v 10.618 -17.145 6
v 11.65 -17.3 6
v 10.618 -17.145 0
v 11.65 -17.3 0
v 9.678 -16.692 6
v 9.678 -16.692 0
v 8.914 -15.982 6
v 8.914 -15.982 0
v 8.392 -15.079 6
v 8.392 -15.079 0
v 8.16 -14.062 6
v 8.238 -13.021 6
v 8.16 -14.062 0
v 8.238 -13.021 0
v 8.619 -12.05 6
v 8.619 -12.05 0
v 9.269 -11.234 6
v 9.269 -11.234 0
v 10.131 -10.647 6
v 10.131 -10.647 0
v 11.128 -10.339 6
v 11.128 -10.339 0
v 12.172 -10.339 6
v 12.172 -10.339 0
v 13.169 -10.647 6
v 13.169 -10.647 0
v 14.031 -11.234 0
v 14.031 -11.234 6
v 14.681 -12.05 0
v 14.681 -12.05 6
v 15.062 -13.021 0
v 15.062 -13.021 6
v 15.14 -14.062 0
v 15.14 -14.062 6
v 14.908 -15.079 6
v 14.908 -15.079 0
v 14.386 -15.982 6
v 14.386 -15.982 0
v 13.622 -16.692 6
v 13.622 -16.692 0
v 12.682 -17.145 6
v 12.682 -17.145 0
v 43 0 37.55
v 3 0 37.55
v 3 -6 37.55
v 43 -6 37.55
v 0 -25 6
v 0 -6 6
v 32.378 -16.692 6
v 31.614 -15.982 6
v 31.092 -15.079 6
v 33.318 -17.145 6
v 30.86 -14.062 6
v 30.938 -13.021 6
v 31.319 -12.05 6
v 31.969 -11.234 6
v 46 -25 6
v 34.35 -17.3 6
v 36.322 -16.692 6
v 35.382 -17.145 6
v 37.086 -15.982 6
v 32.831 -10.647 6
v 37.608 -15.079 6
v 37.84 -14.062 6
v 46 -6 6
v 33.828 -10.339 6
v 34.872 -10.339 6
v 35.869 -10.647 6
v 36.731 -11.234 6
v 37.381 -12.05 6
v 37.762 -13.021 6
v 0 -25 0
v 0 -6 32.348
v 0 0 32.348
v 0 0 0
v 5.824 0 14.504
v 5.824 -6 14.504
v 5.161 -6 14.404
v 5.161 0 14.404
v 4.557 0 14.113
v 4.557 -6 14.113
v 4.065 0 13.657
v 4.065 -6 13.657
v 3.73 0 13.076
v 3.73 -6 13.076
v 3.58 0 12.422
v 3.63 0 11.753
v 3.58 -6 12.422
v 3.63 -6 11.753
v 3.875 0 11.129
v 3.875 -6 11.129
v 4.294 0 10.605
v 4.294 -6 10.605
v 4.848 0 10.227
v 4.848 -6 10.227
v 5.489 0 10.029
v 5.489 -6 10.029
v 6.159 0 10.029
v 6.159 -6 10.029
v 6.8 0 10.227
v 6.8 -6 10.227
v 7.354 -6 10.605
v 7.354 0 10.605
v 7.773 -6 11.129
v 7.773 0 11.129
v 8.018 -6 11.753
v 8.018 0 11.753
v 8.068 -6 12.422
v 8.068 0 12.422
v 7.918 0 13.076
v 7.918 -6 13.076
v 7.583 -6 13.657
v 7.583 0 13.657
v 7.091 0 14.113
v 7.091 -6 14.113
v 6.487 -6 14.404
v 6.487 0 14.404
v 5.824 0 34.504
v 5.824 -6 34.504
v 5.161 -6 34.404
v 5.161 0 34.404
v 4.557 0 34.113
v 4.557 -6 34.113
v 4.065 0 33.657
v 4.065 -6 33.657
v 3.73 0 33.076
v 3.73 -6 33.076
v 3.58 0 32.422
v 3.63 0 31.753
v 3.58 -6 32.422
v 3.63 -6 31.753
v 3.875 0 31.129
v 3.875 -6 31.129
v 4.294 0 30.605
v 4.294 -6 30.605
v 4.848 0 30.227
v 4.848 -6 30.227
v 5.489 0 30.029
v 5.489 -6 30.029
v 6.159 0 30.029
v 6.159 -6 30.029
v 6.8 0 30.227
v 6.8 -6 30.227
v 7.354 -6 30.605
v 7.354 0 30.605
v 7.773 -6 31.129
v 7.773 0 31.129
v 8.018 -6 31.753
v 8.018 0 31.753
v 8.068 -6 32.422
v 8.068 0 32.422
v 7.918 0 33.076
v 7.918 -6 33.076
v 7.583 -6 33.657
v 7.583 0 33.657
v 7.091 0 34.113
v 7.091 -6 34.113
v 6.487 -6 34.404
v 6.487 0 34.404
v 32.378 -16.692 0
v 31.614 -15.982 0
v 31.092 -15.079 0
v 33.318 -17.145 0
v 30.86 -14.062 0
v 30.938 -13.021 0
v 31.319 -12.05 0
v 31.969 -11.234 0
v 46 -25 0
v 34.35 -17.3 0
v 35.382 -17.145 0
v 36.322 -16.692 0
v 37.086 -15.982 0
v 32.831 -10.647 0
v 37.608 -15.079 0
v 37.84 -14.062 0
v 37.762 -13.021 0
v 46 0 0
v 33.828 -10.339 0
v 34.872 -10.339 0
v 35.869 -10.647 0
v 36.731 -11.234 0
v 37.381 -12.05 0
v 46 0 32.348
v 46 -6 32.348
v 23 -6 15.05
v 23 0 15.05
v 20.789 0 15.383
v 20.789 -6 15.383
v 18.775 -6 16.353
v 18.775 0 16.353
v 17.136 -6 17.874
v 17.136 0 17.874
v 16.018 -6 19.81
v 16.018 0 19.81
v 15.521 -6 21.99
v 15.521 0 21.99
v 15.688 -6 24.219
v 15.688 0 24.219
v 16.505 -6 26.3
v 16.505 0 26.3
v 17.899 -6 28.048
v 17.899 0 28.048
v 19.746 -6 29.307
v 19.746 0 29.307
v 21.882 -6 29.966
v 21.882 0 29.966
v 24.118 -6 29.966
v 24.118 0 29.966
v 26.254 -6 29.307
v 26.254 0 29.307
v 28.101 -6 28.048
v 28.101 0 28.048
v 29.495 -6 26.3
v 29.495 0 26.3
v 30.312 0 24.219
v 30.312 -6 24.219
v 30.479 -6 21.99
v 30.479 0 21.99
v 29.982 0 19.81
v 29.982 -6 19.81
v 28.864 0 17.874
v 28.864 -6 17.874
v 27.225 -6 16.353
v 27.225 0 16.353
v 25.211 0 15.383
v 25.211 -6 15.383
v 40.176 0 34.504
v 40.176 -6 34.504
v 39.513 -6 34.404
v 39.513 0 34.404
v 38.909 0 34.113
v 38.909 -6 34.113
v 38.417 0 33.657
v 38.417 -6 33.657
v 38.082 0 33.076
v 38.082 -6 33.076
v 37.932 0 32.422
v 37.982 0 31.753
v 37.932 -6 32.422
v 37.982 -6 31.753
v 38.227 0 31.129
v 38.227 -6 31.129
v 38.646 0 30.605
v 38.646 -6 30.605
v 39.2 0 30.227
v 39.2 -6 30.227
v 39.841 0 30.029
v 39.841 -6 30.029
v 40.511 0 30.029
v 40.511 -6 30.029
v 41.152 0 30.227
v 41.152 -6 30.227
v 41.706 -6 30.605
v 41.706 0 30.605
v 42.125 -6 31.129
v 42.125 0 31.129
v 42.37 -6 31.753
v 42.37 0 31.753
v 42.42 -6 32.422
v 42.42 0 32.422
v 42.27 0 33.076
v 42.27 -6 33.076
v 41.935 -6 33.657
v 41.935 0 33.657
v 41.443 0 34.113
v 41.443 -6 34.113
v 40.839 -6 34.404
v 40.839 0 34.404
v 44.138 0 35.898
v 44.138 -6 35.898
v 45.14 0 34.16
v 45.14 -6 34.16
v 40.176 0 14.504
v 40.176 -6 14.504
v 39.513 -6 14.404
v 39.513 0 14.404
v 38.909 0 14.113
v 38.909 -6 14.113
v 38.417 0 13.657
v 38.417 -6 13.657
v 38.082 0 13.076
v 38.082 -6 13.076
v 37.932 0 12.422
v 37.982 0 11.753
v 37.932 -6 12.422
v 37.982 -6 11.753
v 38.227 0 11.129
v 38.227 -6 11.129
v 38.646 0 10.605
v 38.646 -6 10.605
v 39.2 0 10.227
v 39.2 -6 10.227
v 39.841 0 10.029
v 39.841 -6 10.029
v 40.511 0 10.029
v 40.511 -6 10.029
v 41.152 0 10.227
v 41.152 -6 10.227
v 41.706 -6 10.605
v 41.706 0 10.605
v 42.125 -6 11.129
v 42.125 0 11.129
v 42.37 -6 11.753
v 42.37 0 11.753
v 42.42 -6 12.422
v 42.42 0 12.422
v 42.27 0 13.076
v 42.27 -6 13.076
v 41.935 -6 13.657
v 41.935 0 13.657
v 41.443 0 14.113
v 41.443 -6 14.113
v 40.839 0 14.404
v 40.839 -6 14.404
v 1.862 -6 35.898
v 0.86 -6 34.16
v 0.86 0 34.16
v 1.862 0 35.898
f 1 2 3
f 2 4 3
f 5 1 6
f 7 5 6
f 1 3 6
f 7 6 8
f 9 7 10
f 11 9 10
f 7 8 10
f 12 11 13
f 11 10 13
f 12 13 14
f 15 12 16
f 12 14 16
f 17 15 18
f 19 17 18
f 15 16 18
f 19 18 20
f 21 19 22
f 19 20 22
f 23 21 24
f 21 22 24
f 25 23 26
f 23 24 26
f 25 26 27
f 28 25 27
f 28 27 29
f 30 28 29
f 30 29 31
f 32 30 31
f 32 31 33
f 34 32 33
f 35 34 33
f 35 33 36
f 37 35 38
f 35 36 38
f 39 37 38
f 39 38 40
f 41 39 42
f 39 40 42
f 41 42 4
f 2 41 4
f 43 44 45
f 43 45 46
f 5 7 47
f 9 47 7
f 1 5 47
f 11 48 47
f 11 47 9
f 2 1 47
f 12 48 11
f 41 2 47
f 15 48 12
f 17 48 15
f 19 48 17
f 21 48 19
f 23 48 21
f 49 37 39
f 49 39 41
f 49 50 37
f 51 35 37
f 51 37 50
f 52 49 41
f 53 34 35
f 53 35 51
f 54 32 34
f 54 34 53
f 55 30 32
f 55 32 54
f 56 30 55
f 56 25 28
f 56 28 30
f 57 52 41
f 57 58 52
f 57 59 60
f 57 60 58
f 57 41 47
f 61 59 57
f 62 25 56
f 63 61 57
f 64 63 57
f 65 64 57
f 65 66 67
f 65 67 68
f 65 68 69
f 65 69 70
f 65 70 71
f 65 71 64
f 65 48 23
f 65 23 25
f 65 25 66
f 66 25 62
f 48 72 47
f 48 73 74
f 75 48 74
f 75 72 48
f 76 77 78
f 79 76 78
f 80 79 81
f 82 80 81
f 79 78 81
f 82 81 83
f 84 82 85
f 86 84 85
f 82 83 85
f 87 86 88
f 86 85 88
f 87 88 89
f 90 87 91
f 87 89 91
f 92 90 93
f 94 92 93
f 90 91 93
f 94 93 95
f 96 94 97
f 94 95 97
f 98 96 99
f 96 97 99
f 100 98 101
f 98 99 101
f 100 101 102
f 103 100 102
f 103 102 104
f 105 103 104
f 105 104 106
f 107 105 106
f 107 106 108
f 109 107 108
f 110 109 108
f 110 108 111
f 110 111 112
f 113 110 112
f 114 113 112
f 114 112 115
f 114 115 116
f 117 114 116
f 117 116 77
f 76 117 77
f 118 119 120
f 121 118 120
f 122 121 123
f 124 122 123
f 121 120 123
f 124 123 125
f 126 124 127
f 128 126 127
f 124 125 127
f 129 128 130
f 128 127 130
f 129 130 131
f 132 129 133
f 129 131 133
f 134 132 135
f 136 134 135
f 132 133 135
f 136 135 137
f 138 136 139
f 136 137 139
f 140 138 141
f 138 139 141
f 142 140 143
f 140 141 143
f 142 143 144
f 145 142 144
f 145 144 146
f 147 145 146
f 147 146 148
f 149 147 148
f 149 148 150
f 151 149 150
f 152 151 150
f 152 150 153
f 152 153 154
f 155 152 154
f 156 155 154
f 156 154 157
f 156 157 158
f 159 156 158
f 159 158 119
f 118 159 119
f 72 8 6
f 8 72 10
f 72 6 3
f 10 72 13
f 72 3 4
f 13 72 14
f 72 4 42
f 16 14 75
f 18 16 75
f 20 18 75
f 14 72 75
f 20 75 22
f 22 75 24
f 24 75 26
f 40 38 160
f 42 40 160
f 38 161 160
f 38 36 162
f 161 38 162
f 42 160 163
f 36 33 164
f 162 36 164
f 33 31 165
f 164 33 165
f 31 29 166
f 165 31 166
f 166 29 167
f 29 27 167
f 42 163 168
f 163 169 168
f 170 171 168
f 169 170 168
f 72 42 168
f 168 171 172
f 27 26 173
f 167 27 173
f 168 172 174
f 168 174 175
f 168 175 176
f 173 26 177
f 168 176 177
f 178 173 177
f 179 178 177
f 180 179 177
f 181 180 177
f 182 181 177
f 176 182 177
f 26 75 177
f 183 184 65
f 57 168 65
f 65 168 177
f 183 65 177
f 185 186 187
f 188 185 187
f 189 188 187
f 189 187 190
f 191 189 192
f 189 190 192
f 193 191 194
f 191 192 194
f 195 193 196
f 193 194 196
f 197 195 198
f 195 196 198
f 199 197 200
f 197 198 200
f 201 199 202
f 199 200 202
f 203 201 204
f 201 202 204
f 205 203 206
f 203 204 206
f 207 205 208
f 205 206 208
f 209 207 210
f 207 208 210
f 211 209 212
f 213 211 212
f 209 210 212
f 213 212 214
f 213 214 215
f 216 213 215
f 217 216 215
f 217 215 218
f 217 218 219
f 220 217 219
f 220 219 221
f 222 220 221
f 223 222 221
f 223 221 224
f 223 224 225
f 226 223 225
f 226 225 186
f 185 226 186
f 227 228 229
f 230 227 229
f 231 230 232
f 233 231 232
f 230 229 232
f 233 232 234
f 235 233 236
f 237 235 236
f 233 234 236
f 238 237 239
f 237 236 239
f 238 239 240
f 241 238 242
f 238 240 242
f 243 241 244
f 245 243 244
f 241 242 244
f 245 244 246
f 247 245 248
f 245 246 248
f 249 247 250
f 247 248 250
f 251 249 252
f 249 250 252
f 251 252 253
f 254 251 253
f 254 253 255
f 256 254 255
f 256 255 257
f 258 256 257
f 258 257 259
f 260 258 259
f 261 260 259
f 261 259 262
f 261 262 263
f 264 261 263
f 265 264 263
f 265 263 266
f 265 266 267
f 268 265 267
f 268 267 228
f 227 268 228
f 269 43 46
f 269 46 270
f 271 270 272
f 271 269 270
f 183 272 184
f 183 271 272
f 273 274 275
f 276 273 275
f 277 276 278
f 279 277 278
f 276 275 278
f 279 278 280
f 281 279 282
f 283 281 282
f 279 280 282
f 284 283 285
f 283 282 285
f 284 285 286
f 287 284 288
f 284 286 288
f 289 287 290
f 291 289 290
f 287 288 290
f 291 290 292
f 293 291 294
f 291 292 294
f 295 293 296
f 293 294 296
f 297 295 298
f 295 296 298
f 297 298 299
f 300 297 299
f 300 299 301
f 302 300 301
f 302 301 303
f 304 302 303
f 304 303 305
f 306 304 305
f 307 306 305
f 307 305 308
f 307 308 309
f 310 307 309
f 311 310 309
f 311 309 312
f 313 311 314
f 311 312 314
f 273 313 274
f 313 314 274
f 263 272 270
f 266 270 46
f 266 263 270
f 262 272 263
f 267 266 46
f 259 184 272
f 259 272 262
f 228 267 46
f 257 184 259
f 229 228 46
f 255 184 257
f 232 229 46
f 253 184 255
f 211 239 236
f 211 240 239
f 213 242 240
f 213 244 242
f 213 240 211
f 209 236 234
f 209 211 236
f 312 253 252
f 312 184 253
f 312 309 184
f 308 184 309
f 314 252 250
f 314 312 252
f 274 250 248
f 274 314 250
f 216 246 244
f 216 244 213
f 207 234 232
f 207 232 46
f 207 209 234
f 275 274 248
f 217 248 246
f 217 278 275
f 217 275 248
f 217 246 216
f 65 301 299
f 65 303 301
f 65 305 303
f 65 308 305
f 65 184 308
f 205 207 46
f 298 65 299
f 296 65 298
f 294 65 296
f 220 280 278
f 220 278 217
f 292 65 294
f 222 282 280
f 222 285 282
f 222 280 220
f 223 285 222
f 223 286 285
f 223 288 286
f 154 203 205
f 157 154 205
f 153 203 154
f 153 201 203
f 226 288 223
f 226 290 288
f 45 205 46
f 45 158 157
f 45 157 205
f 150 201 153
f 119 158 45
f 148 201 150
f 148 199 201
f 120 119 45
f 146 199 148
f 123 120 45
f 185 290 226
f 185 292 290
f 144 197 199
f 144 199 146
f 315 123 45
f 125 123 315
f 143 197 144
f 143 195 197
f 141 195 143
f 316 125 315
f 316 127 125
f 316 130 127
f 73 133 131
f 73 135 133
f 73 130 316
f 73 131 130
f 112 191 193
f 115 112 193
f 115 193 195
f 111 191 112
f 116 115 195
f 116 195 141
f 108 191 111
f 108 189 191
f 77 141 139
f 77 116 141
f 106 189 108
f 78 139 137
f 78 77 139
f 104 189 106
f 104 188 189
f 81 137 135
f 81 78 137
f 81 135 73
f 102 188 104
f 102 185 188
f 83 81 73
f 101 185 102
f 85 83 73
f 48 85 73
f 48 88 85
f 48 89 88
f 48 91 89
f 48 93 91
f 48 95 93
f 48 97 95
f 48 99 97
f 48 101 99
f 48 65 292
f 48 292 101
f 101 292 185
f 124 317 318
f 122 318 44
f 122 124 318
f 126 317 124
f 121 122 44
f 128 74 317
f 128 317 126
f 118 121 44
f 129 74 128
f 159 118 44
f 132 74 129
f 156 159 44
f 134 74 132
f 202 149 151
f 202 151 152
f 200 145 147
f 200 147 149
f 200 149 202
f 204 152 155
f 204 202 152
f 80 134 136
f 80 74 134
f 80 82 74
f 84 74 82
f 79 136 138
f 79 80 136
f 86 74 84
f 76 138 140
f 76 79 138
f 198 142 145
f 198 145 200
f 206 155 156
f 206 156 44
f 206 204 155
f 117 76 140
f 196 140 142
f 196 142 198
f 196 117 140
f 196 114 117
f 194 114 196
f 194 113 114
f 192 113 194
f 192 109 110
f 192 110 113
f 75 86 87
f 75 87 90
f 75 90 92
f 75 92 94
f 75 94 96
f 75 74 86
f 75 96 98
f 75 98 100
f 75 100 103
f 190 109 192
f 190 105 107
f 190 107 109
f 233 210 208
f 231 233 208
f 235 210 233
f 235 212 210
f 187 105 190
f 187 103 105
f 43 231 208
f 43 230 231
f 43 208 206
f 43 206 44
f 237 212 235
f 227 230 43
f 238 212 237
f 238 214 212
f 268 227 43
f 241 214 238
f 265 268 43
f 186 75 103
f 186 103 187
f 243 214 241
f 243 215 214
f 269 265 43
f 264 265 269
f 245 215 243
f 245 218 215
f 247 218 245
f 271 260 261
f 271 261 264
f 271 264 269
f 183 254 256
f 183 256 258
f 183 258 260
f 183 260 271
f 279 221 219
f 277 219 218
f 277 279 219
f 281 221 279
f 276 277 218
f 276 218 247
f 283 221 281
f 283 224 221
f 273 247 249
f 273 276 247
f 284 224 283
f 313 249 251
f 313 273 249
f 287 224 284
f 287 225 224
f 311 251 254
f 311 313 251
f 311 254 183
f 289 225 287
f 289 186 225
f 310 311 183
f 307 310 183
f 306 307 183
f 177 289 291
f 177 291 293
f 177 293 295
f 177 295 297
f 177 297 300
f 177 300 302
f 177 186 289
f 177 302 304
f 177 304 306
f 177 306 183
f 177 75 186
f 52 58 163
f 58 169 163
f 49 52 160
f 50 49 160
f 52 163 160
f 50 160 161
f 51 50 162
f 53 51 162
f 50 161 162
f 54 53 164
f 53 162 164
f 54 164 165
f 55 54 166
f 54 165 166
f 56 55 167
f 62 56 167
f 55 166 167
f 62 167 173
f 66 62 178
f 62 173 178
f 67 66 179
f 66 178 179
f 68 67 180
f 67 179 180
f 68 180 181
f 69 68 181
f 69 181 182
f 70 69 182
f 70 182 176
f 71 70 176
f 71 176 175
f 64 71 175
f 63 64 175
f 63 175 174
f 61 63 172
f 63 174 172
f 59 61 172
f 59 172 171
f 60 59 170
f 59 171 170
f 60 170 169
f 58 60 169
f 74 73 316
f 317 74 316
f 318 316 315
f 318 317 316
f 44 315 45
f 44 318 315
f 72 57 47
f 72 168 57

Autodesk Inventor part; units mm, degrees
ref_plane "YZ Plane" through (0, 0, 0) normal (1, 0, 0) x (0, 1, 0)
ref_plane "XZ Plane" through (0, 0, 0) normal (0, 1, 0) x (-1, 0, 0)
ref_plane "XY Plane" through (0, 0, 0) normal (0, 0, 1) x (1, 0, 0)
sketch "Sketch1" plane through (0, 0, 0) normal (0, 0, 1) x (1, 0, 0)
  line L0 (0, 0) -> (46, 0)
  line L1 (46, 0) -> (46, -25)
  line L2 (46, -25) -> (0, -25)
  line L3 (0, -25) -> (0, 0)
  dimension "d0" = 46
  dimension "d1" = 25
extrude "Extrusion1" add sketch "Sketch1" along normal blind 6
sketch "Sketch2" plane through (0, 0, 6) normal (0, 0, 1) x (1, 0, 0)
  line L0 (46, 0) -> (0, 0) construction
  line L1 (23, 0) -> (23, -25) construction
  line L2 (0, -25) -> (46, -25) construction
  line L3 (0, 0) -> (0, -25) construction
  line L4 (0, -13.8) -> (11.65, -13.8) construction
  point P0 (34.35, -13.8)
  dimension "d5" = 13.8
  dimension "d34" = 11.65
hole "Hole1" at (11.65, -13.8, 6) at (34.35, -13.8, 6) direction (0, 0, -1) diameter 7 end through all
sketch "Sketch3" plane through (0, 0, 6) normal (0, 0, 1) x (1, 0, 0)
  line L0 (46, -25) -> (46, 0) projected
  line L1 (0, 0) -> (46, 0)
  line L2 (46, 0) -> (46, -6)
  line L3 (46, -6) -> (0, -6)
  line L4 (0, -6) -> (0, 0)
  dimension "d13" = 6
extrude "Extrusion2" add sketch "Sketch3" along normal blind 31.55
sketch "Sketch4" plane through (0, 0, 0) normal (0, 1, 0) x (1, 0, 0)
  line L0 (0, 0) -> (0, -37.55) construction
  line L1 (0, -12.254) -> (5.824, -12.254) construction
  line L2 (0, -6) -> (46, -6) construction
  line L3 (0, 0) -> (46, 0) construction
  line L4 (23, 0) -> (23, -37.55) construction
  line L5 (46, -37.55) -> (0, -37.55) construction
  line L6 (0, -32.254) -> (5.824, -32.254) construction
  point P0 (40.176, -32.254)
  point P1 (40.176, -12.254)
  dimension "d16" = 12.254
  dimension "d17" = 5.824
  dimension "d18" = 20
hole "Hole2" at (5.824, 0, 32.254) at (5.824, 0, 12.254) at (40.176, 0, 32.254) at (40.176, 0, 12.254) direction (0, -1, 0) diameter 4.5 end through all
sketch "Sketch5" plane through (0, -6, 6) normal (0, -1, 0) x (1, 0, 0)
  line L0 (0, 31.55) -> (46, 31.55) projected
  point P0 (0, -6)
  point P1 (23, 16.55)
  dimension "d26" = 15
hole "Hole3" at (23, -6, 22.55) direction (0, 1, 0) diameter 15 end through all
sketch "Sketch6" plane through (0, 0, 0) normal (0, 1, 0) x (1, 0, 0)
  circle A0 centre (23, -22.55) radius 7.5 projected
  line L0 (0, -37.55) -> (46, -37.55) construction
  line L1 (46, -37.55) -> (0, -37.55) construction
  line L2 (0, -37.55) -> (0, -27.1443) construction
  line L3 (0, 0) -> (0, -37.55) construction
  line L4 (46, -37.55) -> (46, -28.4346) construction
  line L5 (46, -6) -> (46, -37.55) construction
  arc A1 (0, -32.348) -> (3, -37.55) centre (23, -22.55) ccw
  arc A2 (43, -37.55) -> (46, -32.348) centre (23, -22.55) ccw
  line L6 (43, -37.55) -> (46, -37.55)
  line L7 (3, -37.55) -> (0, -37.55)
  line L8 (0, -32.348) -> (0, -37.55)
  line L9 (46, -37.55) -> (46, -32.348)
extrude "Extrusion3" cut sketch "Sketch6" against normal up to next contours A1 L7 L8 | A2 L9 L6
thread "Thread5" size "M7x1" class "6H" standard "ANSI Metric M Profile" full length
thread "Thread6" size "M7x1" class "6H" standard "ANSI Metric M Profile" full length
thread "Thread7" size "M4.5x0.75" class "6H" standard "ANSI Metric M Profile" full length
thread "Thread8" size "M4.5x0.75" class "6H" standard "ANSI Metric M Profile" full length
thread "Thread9" size "M4.5x0.75" class "6H" standard "ANSI Metric M Profile" full length
thread "Thread10" size "M4.5x0.75" class "6H" standard "ANSI Metric M Profile" full length
thread "Thread11" size "M4.5x0.75" class "6H" standard "ANSI Metric M Profile" full length
properties part number "X-axis Ball Screw Support"
